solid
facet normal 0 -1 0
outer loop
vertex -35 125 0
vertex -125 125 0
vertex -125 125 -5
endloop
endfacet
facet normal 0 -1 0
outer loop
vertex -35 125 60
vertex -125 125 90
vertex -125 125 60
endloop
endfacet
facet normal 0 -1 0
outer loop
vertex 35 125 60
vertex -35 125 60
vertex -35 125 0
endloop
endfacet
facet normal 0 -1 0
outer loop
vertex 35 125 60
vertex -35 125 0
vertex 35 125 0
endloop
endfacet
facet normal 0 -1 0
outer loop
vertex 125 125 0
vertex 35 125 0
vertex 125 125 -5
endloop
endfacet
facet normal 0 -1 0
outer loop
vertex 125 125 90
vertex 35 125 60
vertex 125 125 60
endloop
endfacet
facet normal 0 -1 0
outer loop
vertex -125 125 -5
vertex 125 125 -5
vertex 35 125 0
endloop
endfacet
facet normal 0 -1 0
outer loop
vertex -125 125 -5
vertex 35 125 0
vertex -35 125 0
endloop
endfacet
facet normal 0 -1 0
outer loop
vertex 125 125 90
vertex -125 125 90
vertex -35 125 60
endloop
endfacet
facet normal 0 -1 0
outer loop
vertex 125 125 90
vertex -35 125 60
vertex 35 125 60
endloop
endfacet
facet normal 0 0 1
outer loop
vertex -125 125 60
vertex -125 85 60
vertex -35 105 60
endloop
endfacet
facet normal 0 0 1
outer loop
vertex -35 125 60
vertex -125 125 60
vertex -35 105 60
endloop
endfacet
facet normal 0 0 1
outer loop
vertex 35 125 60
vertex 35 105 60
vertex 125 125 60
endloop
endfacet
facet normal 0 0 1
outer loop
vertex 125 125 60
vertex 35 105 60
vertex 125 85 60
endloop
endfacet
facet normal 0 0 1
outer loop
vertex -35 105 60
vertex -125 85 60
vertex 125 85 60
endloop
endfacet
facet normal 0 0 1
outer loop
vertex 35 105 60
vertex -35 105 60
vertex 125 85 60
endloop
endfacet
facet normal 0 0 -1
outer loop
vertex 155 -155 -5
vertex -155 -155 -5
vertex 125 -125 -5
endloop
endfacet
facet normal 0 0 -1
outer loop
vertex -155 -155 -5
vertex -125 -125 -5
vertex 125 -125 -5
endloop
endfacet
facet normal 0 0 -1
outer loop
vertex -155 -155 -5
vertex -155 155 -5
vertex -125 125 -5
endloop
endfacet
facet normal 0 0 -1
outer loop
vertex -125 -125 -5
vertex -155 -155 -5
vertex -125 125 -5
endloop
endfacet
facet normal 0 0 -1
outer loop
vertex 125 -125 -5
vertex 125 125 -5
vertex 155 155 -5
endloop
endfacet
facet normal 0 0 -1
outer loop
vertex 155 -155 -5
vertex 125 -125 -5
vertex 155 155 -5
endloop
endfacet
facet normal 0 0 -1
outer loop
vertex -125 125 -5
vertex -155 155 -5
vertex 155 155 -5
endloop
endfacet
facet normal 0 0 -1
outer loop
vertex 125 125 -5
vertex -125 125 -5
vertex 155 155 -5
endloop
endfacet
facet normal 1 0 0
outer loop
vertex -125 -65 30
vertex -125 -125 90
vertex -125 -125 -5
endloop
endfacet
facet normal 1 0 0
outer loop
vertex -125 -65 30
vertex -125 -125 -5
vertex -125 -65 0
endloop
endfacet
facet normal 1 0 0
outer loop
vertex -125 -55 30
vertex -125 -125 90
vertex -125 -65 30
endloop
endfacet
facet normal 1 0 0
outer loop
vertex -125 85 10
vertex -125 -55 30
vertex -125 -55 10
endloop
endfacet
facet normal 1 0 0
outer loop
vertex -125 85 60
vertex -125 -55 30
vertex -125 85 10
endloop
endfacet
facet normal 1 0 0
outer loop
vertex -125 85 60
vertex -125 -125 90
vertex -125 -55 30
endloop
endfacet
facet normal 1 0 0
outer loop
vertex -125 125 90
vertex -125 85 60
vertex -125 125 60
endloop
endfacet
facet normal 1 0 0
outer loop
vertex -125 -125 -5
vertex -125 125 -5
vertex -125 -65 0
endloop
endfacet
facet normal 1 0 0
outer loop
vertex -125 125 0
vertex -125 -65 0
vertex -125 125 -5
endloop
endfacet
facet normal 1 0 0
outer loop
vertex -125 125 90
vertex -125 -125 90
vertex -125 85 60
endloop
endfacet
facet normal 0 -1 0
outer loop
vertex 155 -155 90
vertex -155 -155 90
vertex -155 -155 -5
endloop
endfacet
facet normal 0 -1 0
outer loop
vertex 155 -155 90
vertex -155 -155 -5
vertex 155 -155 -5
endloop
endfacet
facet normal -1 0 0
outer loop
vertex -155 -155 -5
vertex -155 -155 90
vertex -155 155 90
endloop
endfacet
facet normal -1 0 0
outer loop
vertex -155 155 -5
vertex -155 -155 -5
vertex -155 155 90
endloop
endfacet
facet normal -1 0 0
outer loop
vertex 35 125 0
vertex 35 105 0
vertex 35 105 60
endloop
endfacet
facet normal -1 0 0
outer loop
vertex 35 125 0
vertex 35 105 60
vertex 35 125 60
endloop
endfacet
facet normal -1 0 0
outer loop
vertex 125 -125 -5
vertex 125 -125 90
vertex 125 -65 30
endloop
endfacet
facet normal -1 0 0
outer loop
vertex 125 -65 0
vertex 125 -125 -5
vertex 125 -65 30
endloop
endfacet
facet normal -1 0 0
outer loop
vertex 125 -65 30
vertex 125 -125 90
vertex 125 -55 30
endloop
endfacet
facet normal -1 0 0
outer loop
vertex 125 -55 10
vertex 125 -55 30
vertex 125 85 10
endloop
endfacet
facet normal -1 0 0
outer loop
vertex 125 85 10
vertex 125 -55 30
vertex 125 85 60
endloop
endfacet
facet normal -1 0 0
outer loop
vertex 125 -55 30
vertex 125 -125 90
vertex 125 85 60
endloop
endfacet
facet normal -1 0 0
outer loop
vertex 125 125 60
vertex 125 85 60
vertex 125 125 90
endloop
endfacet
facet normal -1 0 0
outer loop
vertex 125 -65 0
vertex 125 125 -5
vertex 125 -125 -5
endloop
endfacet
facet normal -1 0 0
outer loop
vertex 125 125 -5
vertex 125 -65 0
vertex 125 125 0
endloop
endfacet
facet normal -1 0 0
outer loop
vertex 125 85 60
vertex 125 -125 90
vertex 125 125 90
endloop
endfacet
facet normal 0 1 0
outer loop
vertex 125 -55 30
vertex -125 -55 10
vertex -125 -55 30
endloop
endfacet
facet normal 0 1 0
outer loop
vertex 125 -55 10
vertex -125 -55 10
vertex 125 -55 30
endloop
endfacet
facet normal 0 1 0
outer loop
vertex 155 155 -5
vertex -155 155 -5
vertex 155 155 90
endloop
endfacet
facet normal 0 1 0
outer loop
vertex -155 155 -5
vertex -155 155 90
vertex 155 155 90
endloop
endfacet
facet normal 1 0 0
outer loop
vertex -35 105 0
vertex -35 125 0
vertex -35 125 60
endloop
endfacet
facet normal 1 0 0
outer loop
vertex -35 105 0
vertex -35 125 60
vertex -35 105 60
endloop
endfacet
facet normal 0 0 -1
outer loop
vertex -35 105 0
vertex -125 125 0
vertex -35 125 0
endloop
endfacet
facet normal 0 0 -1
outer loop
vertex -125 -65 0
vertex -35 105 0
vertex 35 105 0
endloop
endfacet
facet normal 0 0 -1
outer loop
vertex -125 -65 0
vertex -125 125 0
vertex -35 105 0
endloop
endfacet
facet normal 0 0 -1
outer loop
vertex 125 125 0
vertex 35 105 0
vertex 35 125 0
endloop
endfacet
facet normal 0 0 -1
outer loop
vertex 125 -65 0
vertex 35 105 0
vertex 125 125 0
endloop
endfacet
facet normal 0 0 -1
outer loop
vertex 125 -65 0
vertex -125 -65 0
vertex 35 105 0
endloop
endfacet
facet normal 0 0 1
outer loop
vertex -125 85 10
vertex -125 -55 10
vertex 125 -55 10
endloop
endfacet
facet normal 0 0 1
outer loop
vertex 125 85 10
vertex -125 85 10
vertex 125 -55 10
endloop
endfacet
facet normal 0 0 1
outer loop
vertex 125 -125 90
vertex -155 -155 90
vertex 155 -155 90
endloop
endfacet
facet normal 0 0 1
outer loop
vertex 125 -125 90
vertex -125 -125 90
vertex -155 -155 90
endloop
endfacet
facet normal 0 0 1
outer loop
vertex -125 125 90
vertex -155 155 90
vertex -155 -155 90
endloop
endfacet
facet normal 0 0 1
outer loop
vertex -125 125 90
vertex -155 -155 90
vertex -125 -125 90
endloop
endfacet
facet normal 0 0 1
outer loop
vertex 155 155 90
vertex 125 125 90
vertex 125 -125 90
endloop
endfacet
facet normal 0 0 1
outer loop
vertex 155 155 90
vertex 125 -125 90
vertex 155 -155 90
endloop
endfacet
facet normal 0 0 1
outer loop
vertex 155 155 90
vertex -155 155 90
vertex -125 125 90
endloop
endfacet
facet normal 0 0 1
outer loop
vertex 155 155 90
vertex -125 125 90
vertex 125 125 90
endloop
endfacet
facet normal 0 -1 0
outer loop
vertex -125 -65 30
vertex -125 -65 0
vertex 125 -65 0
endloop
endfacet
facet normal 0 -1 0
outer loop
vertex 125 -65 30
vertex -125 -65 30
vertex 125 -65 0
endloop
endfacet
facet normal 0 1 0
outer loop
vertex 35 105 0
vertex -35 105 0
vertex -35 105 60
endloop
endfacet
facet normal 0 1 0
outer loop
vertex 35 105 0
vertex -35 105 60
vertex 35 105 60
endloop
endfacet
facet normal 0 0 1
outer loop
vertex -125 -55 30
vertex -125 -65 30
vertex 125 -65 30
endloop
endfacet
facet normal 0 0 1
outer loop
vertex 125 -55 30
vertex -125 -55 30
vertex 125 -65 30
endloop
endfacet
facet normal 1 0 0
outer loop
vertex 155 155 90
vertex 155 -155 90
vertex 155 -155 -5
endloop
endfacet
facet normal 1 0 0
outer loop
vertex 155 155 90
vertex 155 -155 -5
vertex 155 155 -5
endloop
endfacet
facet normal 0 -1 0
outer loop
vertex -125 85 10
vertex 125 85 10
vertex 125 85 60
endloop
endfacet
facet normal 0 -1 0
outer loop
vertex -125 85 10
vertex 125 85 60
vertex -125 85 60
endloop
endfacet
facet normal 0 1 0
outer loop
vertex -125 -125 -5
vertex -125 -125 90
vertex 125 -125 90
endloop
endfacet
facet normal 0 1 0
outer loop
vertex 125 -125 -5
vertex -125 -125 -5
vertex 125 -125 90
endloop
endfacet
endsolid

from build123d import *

# Parameters (mm, degrees)
F0_W     = 310
F0_H     = 310
F0_W_2   = 250
F0_H_2   = 250
F1_DEPTH = 90
F3_DEPTH = 60
F4_W     = 250
F4_H     = 140
F4_H_2   = 10
F5_DEPTH = 10
F6_DEPTH = 30
F7_DEPTH = 5


with BuildPart() as f1:
    # F0 (on Top) → F1 (new body)
    with BuildSketch(Plane.XY):
        Rectangle(F0_W, F0_H)
        Rectangle(F0_W_2, F0_H_2, mode=Mode.SUBTRACT)
    extrude(amount=F1_DEPTH)

    # F2 (on face) → F3 (join)
    with BuildSketch(Plane(origin=(0, 0, 0), x_dir=(1, 0, 0), z_dir=(0, 0, -1))):
        Polygon((-125, -85), (-125, -125), (-35, -125), (-35, -105), (35, -105), (35, -125), (125, -125), (125, -85), align=None)
    extrude(amount=-F3_DEPTH)

    # F4 (on face) → F5 (join)
    with BuildSketch(Plane(origin=(0, 0, 0), x_dir=(1, 0, 0), z_dir=(0, 0, -1))):
        with Locations((0, -15)):
            Rectangle(F4_W, F4_H)
        with Locations((0, 60)):
            Rectangle(F4_W, F4_H_2)
    extrude(amount=-F5_DEPTH)

    # F4 (on face) → F6 (join)
    with BuildSketch(Plane(origin=(0, 0, 0), x_dir=(1, 0, 0), z_dir=(0, 0, -1))):
        with Locations((0, 60)):
            Rectangle(F4_W, F4_H_2)
    extrude(amount=-F6_DEPTH)

    # F0 (on Top) → F7 (join)
    with BuildSketch(Plane.XY):
        Rectangle(F0_W, F0_H)
        Rectangle(F0_W_2, F0_H_2, mode=Mode.SUBTRACT)
    extrude(amount=-F7_DEPTH)


solid = f1.part
